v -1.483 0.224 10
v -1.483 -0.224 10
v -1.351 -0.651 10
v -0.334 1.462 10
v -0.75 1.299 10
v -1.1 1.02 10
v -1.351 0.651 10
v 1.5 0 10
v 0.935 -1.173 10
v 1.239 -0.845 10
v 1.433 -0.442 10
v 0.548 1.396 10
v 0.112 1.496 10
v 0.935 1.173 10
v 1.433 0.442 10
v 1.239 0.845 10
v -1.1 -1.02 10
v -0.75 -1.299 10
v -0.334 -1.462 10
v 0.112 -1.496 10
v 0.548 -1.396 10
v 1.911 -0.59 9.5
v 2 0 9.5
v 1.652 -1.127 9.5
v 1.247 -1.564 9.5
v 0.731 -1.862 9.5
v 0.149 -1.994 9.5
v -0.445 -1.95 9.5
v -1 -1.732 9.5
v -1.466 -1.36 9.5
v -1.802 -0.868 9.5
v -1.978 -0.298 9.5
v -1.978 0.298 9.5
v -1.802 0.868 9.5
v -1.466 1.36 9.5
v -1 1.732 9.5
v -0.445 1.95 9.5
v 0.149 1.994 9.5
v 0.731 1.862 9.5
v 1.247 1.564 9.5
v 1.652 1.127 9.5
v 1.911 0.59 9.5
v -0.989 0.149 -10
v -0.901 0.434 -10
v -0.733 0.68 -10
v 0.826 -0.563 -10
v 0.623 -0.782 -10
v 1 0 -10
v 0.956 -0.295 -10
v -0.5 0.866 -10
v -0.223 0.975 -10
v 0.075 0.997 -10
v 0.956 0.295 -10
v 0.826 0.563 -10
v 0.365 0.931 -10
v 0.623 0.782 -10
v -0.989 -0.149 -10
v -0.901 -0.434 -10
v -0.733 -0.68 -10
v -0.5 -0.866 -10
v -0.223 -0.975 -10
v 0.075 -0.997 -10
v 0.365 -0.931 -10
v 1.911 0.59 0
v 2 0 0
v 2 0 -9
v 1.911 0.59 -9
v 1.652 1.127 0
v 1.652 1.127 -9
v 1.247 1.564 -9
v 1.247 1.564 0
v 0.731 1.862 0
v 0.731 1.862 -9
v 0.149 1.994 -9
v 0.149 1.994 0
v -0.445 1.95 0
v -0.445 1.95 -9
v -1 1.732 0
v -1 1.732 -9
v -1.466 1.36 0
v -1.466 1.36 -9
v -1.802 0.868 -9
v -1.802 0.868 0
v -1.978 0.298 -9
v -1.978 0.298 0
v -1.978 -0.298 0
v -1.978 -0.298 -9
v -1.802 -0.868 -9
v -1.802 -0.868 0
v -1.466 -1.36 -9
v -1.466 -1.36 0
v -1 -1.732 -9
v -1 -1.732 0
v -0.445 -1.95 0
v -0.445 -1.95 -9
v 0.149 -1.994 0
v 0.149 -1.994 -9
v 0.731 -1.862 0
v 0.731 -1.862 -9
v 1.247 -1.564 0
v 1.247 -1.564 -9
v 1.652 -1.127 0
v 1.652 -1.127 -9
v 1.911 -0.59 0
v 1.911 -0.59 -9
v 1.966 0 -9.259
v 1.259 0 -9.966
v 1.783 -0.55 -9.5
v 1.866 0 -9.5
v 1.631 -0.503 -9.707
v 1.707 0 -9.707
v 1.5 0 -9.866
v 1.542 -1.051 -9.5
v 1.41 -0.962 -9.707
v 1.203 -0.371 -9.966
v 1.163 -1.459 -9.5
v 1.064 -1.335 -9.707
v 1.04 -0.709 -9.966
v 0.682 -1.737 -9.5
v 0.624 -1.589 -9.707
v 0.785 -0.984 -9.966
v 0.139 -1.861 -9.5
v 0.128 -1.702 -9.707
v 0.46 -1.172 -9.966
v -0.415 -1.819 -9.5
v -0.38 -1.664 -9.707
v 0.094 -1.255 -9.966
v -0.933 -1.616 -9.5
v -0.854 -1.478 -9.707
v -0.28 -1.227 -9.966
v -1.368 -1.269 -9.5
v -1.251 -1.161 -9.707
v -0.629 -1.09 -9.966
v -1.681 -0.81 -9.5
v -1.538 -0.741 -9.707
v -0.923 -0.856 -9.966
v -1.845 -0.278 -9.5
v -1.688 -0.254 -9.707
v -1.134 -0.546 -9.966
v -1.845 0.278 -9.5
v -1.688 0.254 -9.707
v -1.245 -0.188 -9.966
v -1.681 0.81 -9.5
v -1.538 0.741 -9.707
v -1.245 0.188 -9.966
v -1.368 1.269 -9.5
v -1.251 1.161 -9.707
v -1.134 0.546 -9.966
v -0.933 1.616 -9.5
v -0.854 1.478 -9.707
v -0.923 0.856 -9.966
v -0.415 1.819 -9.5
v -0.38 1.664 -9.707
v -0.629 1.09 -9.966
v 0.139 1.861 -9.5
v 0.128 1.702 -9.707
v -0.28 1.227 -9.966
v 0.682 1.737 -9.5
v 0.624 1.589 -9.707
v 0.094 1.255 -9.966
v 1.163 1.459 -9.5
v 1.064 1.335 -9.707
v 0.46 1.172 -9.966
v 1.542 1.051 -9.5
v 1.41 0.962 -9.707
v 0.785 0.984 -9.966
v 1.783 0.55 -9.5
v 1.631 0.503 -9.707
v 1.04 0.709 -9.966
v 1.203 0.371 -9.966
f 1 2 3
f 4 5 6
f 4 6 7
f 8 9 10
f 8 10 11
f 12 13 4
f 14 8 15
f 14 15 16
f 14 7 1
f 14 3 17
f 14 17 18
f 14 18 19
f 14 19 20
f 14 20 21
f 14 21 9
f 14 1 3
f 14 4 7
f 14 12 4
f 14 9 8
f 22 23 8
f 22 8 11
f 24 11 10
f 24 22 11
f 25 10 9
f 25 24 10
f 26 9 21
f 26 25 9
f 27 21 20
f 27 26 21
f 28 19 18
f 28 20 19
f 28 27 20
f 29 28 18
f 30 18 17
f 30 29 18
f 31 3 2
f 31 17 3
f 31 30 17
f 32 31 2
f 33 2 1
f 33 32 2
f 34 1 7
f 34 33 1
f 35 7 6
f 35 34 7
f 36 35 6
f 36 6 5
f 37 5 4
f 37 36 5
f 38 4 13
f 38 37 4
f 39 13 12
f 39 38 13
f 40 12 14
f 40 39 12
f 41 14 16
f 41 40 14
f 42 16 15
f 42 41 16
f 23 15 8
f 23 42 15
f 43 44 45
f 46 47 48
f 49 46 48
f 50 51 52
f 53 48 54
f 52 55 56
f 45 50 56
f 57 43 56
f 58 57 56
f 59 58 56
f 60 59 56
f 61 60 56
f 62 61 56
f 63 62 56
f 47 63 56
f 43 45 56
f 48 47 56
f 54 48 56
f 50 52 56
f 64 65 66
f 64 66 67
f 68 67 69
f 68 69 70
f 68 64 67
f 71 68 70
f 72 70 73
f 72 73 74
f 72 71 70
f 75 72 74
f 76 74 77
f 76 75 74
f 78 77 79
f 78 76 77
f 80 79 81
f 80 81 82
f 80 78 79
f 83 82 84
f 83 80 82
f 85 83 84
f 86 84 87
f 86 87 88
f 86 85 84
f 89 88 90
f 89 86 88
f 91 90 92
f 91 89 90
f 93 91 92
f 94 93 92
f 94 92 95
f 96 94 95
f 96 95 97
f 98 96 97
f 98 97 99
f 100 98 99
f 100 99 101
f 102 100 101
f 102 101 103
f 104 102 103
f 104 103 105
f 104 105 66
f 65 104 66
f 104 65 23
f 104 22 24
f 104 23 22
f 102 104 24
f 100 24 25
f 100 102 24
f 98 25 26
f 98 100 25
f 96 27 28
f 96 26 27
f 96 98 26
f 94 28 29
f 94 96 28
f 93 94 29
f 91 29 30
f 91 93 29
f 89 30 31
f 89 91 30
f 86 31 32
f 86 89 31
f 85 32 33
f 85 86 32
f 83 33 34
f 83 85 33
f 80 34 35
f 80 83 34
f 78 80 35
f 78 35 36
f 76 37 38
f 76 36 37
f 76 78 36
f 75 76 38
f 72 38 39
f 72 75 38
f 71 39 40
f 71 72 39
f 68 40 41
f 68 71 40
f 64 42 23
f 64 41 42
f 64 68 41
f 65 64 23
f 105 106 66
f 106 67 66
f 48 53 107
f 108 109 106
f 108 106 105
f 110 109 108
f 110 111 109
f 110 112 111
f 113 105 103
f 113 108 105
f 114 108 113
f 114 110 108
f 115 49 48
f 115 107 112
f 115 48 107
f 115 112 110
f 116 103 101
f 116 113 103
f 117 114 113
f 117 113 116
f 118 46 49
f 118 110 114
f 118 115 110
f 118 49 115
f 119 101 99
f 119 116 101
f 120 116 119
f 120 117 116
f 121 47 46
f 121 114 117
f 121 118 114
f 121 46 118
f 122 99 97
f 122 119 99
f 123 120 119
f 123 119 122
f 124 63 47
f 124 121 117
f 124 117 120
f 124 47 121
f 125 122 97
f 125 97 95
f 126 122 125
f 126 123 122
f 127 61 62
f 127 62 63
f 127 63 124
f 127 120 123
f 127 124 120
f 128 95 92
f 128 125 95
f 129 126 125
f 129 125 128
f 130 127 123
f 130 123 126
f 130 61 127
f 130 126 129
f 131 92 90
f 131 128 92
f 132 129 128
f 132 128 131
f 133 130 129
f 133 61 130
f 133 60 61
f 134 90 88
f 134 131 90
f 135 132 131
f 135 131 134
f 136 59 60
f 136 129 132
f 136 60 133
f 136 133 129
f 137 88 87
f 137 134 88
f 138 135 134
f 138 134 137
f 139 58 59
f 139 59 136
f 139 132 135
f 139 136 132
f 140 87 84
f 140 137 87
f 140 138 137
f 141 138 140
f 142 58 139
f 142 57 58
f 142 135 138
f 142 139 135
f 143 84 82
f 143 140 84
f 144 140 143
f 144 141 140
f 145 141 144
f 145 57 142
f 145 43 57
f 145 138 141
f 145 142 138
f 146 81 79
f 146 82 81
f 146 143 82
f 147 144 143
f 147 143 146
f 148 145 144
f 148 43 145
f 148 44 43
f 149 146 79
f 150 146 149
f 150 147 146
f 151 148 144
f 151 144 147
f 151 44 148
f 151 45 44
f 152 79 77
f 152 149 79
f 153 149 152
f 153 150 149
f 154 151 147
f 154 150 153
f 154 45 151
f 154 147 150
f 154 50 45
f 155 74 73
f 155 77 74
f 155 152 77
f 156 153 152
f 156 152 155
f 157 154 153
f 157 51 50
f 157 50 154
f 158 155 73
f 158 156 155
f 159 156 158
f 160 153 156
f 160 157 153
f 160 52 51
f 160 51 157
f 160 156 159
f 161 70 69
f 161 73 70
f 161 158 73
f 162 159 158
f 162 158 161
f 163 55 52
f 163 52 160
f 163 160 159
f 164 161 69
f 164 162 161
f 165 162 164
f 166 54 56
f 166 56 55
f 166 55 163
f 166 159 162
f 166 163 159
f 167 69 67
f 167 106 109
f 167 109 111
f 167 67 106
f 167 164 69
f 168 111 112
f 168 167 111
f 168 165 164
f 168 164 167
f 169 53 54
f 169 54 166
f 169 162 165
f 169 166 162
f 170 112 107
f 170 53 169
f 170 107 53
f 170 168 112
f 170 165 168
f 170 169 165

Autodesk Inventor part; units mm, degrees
ref_plane "YZ Plane" through (0, 0, 0) normal (1, 0, 0) x (0, 1, 0)
ref_plane "XZ Plane" through (0, 0, 0) normal (0, 1, 0) x (-1, 0, 0)
ref_plane "XY Plane" through (0, 0, 0) normal (0, 0, 1) x (1, 0, 0)
sketch "Sketch1" plane through (0, 0, 0) normal (0, 0, 1) x (1, 0, 0)
  circle A0 centre (0, 0) radius 2
  dimension "d0" = 4
extrude "Extrusion1" add sketch "Sketch1" along normal mid plane 20
fillet "Fillet1" radius 1 1 edges at (-2, 0, -10)
chamfer "Chamfer1" distance 0.5 angle 45 1 edges at (-2, 0, 10)
properties part number "DOWEL,M4X20" material "Steel"
